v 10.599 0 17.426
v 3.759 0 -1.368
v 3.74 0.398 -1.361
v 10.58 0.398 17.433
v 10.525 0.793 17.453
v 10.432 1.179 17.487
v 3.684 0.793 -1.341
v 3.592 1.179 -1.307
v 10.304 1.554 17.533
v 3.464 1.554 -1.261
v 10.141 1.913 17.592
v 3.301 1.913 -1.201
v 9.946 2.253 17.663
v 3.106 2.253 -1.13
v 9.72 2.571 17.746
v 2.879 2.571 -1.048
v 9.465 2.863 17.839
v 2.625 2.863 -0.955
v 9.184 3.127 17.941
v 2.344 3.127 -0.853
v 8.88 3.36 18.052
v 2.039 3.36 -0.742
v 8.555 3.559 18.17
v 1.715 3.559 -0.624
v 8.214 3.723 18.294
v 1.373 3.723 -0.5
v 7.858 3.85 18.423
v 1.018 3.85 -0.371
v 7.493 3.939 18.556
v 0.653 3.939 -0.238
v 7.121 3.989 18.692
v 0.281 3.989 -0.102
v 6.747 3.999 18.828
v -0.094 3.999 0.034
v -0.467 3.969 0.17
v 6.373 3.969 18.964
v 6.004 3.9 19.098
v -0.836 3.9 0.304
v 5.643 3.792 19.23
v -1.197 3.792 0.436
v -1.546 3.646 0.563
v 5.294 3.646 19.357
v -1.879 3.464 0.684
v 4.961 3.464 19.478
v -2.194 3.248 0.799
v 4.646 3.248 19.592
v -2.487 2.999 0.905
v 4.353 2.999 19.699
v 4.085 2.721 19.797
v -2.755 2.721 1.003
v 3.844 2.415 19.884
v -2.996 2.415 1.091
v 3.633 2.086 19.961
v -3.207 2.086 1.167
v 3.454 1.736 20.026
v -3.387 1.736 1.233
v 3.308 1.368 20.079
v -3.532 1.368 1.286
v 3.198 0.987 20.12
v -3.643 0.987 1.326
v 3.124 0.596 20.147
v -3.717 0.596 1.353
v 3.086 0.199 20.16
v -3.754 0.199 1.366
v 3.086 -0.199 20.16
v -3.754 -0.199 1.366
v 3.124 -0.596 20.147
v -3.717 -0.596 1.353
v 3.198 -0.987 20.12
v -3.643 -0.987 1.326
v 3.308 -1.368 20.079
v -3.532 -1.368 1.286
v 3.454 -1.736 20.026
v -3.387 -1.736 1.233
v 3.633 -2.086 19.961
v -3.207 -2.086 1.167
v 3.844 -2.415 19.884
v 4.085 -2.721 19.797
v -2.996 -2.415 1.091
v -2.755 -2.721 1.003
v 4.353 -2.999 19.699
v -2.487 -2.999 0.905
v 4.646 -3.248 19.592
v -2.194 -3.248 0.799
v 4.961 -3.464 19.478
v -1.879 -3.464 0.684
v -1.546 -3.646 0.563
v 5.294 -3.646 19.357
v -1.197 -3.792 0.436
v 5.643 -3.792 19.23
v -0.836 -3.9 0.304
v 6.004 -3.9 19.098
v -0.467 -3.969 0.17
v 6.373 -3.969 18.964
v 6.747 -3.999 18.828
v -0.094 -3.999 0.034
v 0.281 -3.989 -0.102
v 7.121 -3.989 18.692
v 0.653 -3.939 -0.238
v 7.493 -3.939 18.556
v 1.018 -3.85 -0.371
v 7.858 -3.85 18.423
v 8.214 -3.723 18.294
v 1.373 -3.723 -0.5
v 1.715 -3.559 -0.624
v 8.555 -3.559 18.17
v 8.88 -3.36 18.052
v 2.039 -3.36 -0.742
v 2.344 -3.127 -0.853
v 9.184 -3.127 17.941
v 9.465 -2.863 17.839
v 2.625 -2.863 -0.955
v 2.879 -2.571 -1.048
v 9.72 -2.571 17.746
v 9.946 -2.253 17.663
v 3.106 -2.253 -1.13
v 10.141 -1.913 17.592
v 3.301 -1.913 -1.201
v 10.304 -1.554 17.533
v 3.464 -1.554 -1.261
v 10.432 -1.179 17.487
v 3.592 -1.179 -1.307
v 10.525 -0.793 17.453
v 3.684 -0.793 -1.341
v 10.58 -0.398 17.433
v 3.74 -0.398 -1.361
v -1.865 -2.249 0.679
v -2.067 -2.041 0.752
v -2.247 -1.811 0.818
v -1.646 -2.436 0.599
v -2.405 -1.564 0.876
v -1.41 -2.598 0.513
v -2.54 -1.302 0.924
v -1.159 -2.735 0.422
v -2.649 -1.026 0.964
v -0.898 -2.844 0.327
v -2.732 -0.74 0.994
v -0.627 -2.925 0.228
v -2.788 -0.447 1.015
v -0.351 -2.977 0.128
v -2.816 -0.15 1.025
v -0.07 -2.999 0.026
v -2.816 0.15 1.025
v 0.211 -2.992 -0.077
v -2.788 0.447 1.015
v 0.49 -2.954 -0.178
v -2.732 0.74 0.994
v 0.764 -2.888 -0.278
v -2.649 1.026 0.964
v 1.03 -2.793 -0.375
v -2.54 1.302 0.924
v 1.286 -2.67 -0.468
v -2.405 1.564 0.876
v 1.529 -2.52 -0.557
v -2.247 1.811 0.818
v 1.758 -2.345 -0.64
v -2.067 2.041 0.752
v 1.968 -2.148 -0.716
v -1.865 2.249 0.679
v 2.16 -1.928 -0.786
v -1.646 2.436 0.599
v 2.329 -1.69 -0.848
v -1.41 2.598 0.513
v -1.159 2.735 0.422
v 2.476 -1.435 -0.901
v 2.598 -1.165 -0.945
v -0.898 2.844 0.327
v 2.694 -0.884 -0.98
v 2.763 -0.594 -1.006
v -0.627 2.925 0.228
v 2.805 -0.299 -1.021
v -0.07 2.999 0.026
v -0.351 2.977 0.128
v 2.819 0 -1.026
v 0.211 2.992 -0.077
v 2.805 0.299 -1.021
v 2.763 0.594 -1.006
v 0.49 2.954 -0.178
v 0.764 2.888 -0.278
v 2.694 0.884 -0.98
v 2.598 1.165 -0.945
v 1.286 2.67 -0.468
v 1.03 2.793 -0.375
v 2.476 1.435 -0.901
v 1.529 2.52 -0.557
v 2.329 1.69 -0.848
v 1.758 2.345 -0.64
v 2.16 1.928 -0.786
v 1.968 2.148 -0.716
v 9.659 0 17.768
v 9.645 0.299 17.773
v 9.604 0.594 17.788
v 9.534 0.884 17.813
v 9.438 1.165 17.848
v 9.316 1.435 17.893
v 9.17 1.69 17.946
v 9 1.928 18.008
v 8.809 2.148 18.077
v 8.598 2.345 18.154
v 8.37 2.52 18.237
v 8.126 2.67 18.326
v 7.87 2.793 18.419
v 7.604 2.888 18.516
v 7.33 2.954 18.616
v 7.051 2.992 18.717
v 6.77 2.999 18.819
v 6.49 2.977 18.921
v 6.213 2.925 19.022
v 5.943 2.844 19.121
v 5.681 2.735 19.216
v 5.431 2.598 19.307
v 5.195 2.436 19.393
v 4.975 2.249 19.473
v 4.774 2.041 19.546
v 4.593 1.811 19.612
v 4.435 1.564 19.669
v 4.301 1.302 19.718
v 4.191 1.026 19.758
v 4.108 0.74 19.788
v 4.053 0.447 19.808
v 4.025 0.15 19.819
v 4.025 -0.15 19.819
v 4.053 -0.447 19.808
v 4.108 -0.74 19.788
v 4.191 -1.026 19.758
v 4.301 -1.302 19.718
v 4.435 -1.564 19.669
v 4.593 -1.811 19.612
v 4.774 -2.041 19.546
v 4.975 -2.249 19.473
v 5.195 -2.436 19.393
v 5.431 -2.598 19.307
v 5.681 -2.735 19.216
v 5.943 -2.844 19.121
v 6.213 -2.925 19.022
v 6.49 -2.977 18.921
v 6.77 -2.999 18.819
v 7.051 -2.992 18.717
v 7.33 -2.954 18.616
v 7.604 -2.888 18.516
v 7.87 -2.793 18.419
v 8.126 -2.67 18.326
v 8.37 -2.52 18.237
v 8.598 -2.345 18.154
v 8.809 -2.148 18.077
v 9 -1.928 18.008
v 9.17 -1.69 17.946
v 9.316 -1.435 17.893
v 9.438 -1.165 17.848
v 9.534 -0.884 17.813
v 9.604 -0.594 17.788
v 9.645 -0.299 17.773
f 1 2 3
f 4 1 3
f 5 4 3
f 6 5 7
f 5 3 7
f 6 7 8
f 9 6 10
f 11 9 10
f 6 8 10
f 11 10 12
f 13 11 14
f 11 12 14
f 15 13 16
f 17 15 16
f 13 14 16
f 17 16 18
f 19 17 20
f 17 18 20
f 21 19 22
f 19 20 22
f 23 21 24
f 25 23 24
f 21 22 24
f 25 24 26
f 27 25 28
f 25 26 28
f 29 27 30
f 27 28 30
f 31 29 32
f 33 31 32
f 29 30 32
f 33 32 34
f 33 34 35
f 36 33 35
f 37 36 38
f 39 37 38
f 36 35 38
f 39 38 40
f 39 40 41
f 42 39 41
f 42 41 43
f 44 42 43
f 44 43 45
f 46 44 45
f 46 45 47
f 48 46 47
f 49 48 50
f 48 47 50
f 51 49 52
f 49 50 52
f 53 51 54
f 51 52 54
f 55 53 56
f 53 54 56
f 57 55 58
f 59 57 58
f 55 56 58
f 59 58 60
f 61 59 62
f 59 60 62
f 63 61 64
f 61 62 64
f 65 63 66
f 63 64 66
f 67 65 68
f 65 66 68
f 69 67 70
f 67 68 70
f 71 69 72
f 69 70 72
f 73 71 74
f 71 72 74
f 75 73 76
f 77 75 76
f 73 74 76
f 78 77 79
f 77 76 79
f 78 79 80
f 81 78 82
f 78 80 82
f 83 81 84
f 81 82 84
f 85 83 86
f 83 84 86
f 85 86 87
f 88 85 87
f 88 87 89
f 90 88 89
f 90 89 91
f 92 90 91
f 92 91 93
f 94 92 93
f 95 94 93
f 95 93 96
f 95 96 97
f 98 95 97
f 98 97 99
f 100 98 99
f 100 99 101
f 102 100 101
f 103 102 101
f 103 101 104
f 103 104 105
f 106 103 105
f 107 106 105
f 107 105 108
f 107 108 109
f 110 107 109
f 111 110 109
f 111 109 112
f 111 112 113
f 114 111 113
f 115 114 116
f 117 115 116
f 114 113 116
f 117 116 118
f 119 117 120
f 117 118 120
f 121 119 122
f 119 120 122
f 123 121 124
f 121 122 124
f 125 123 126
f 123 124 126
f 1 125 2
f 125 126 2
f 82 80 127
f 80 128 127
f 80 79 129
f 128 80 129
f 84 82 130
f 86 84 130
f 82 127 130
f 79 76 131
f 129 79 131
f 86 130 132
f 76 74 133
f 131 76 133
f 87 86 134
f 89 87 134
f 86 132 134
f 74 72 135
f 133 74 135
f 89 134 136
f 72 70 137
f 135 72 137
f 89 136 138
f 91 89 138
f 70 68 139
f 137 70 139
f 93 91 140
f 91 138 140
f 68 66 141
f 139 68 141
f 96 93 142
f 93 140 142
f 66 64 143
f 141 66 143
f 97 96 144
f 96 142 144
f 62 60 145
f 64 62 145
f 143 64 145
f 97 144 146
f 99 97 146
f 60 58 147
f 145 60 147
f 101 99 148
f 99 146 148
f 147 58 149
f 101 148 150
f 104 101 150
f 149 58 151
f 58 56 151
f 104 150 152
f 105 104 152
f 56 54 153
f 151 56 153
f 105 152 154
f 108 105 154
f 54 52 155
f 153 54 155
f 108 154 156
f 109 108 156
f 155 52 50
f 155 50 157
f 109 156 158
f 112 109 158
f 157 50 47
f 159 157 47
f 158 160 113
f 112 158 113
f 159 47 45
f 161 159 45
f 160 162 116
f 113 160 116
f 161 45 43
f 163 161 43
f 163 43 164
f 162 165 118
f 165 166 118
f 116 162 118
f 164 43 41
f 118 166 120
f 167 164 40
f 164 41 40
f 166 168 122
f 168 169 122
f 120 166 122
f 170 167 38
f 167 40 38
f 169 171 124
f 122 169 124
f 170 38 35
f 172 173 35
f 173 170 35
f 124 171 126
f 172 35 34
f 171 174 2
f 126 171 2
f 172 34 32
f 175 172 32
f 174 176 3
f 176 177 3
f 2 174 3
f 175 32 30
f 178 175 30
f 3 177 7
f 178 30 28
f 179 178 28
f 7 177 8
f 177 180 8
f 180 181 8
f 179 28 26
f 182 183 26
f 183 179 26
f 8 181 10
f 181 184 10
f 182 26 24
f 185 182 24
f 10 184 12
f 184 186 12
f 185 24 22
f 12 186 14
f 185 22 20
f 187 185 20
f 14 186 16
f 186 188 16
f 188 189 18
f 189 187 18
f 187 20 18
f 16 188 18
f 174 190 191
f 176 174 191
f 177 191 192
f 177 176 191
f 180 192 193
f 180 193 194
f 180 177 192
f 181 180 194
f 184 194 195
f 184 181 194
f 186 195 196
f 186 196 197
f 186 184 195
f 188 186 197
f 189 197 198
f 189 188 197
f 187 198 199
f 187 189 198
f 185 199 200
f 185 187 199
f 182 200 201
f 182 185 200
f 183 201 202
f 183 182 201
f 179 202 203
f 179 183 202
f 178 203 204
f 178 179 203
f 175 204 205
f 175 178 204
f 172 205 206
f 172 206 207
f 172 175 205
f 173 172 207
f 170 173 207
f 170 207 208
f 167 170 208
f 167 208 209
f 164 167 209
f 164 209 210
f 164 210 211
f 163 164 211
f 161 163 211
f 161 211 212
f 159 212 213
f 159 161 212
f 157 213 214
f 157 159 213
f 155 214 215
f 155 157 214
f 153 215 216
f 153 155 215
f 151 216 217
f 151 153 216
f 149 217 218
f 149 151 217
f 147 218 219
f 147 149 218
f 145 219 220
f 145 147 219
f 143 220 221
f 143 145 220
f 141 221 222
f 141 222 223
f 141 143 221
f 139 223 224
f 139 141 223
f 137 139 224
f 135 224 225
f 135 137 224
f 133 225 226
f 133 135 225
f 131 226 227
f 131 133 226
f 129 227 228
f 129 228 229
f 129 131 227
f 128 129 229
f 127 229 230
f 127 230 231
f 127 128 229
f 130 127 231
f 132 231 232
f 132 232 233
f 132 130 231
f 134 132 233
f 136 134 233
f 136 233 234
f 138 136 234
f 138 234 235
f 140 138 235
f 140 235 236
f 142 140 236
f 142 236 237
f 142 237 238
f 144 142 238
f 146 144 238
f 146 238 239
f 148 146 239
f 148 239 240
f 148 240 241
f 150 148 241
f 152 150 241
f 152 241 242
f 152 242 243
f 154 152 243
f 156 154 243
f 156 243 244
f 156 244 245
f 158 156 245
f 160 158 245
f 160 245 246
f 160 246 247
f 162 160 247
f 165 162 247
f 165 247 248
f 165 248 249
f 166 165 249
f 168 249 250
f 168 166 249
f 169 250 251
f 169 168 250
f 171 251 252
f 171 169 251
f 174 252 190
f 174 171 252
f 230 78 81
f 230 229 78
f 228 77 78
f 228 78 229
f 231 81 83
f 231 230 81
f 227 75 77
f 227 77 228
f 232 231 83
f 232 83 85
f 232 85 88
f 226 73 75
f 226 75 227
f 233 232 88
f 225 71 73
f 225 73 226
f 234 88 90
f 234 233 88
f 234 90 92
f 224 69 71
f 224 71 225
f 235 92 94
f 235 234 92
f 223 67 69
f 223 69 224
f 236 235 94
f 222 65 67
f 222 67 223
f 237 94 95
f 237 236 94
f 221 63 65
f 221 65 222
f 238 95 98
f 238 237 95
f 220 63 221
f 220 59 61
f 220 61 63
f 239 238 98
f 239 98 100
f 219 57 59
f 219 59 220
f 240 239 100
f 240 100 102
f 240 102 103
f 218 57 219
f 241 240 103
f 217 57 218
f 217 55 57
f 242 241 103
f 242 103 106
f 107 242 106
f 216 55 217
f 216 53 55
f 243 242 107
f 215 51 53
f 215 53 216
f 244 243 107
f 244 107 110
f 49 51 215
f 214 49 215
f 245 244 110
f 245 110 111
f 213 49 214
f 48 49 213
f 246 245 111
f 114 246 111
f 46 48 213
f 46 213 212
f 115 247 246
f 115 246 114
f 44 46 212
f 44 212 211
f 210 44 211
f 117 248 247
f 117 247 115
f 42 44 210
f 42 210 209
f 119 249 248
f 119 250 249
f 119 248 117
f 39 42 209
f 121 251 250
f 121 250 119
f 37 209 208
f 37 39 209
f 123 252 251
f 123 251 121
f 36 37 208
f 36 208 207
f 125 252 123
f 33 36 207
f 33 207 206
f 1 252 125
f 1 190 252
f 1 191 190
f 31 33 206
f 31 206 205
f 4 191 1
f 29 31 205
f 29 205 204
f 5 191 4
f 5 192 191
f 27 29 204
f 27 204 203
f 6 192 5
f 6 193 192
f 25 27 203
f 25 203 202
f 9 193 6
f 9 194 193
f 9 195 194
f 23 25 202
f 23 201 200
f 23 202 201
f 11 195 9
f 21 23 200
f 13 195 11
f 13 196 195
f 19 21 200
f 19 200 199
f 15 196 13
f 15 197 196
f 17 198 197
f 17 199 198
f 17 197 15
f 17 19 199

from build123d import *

# Parameters (mm, degrees)
CYLINDER001_R      = 3
CYLINDER001_DEPTH  = 20
CYLINDER_R         = 4
CYLINDER_DEPTH     = 20
CUT001_PITCH_ANGLE = 20


with BuildPart() as tubeinside:
    # Cylinder001 → Cylinder001 (new body)
    with BuildSketch(Plane.XY):
        Circle(CYLINDER001_R)
    extrude(amount=CYLINDER001_DEPTH)


with BuildPart() as tube:
    # Cylinder → Cylinder (new body)
    with BuildSketch(Plane.XY):
        Circle(CYLINDER_R)
    extrude(amount=CYLINDER_DEPTH)

    # Cut001: cut TubeInside
    add(tubeinside.part, mode=Mode.SUBTRACT)


with BuildPart() as tube_1:
    # Cut001 pitch: moved
    add(tube.part.rotate(Axis((0, 0, 0), (0, 1, 0)), CUT001_PITCH_ANGLE))


with BuildPart() as tube_2:
    # Cut001 placement: moved
    add(tube_1.part)


solid = tube_2.part
